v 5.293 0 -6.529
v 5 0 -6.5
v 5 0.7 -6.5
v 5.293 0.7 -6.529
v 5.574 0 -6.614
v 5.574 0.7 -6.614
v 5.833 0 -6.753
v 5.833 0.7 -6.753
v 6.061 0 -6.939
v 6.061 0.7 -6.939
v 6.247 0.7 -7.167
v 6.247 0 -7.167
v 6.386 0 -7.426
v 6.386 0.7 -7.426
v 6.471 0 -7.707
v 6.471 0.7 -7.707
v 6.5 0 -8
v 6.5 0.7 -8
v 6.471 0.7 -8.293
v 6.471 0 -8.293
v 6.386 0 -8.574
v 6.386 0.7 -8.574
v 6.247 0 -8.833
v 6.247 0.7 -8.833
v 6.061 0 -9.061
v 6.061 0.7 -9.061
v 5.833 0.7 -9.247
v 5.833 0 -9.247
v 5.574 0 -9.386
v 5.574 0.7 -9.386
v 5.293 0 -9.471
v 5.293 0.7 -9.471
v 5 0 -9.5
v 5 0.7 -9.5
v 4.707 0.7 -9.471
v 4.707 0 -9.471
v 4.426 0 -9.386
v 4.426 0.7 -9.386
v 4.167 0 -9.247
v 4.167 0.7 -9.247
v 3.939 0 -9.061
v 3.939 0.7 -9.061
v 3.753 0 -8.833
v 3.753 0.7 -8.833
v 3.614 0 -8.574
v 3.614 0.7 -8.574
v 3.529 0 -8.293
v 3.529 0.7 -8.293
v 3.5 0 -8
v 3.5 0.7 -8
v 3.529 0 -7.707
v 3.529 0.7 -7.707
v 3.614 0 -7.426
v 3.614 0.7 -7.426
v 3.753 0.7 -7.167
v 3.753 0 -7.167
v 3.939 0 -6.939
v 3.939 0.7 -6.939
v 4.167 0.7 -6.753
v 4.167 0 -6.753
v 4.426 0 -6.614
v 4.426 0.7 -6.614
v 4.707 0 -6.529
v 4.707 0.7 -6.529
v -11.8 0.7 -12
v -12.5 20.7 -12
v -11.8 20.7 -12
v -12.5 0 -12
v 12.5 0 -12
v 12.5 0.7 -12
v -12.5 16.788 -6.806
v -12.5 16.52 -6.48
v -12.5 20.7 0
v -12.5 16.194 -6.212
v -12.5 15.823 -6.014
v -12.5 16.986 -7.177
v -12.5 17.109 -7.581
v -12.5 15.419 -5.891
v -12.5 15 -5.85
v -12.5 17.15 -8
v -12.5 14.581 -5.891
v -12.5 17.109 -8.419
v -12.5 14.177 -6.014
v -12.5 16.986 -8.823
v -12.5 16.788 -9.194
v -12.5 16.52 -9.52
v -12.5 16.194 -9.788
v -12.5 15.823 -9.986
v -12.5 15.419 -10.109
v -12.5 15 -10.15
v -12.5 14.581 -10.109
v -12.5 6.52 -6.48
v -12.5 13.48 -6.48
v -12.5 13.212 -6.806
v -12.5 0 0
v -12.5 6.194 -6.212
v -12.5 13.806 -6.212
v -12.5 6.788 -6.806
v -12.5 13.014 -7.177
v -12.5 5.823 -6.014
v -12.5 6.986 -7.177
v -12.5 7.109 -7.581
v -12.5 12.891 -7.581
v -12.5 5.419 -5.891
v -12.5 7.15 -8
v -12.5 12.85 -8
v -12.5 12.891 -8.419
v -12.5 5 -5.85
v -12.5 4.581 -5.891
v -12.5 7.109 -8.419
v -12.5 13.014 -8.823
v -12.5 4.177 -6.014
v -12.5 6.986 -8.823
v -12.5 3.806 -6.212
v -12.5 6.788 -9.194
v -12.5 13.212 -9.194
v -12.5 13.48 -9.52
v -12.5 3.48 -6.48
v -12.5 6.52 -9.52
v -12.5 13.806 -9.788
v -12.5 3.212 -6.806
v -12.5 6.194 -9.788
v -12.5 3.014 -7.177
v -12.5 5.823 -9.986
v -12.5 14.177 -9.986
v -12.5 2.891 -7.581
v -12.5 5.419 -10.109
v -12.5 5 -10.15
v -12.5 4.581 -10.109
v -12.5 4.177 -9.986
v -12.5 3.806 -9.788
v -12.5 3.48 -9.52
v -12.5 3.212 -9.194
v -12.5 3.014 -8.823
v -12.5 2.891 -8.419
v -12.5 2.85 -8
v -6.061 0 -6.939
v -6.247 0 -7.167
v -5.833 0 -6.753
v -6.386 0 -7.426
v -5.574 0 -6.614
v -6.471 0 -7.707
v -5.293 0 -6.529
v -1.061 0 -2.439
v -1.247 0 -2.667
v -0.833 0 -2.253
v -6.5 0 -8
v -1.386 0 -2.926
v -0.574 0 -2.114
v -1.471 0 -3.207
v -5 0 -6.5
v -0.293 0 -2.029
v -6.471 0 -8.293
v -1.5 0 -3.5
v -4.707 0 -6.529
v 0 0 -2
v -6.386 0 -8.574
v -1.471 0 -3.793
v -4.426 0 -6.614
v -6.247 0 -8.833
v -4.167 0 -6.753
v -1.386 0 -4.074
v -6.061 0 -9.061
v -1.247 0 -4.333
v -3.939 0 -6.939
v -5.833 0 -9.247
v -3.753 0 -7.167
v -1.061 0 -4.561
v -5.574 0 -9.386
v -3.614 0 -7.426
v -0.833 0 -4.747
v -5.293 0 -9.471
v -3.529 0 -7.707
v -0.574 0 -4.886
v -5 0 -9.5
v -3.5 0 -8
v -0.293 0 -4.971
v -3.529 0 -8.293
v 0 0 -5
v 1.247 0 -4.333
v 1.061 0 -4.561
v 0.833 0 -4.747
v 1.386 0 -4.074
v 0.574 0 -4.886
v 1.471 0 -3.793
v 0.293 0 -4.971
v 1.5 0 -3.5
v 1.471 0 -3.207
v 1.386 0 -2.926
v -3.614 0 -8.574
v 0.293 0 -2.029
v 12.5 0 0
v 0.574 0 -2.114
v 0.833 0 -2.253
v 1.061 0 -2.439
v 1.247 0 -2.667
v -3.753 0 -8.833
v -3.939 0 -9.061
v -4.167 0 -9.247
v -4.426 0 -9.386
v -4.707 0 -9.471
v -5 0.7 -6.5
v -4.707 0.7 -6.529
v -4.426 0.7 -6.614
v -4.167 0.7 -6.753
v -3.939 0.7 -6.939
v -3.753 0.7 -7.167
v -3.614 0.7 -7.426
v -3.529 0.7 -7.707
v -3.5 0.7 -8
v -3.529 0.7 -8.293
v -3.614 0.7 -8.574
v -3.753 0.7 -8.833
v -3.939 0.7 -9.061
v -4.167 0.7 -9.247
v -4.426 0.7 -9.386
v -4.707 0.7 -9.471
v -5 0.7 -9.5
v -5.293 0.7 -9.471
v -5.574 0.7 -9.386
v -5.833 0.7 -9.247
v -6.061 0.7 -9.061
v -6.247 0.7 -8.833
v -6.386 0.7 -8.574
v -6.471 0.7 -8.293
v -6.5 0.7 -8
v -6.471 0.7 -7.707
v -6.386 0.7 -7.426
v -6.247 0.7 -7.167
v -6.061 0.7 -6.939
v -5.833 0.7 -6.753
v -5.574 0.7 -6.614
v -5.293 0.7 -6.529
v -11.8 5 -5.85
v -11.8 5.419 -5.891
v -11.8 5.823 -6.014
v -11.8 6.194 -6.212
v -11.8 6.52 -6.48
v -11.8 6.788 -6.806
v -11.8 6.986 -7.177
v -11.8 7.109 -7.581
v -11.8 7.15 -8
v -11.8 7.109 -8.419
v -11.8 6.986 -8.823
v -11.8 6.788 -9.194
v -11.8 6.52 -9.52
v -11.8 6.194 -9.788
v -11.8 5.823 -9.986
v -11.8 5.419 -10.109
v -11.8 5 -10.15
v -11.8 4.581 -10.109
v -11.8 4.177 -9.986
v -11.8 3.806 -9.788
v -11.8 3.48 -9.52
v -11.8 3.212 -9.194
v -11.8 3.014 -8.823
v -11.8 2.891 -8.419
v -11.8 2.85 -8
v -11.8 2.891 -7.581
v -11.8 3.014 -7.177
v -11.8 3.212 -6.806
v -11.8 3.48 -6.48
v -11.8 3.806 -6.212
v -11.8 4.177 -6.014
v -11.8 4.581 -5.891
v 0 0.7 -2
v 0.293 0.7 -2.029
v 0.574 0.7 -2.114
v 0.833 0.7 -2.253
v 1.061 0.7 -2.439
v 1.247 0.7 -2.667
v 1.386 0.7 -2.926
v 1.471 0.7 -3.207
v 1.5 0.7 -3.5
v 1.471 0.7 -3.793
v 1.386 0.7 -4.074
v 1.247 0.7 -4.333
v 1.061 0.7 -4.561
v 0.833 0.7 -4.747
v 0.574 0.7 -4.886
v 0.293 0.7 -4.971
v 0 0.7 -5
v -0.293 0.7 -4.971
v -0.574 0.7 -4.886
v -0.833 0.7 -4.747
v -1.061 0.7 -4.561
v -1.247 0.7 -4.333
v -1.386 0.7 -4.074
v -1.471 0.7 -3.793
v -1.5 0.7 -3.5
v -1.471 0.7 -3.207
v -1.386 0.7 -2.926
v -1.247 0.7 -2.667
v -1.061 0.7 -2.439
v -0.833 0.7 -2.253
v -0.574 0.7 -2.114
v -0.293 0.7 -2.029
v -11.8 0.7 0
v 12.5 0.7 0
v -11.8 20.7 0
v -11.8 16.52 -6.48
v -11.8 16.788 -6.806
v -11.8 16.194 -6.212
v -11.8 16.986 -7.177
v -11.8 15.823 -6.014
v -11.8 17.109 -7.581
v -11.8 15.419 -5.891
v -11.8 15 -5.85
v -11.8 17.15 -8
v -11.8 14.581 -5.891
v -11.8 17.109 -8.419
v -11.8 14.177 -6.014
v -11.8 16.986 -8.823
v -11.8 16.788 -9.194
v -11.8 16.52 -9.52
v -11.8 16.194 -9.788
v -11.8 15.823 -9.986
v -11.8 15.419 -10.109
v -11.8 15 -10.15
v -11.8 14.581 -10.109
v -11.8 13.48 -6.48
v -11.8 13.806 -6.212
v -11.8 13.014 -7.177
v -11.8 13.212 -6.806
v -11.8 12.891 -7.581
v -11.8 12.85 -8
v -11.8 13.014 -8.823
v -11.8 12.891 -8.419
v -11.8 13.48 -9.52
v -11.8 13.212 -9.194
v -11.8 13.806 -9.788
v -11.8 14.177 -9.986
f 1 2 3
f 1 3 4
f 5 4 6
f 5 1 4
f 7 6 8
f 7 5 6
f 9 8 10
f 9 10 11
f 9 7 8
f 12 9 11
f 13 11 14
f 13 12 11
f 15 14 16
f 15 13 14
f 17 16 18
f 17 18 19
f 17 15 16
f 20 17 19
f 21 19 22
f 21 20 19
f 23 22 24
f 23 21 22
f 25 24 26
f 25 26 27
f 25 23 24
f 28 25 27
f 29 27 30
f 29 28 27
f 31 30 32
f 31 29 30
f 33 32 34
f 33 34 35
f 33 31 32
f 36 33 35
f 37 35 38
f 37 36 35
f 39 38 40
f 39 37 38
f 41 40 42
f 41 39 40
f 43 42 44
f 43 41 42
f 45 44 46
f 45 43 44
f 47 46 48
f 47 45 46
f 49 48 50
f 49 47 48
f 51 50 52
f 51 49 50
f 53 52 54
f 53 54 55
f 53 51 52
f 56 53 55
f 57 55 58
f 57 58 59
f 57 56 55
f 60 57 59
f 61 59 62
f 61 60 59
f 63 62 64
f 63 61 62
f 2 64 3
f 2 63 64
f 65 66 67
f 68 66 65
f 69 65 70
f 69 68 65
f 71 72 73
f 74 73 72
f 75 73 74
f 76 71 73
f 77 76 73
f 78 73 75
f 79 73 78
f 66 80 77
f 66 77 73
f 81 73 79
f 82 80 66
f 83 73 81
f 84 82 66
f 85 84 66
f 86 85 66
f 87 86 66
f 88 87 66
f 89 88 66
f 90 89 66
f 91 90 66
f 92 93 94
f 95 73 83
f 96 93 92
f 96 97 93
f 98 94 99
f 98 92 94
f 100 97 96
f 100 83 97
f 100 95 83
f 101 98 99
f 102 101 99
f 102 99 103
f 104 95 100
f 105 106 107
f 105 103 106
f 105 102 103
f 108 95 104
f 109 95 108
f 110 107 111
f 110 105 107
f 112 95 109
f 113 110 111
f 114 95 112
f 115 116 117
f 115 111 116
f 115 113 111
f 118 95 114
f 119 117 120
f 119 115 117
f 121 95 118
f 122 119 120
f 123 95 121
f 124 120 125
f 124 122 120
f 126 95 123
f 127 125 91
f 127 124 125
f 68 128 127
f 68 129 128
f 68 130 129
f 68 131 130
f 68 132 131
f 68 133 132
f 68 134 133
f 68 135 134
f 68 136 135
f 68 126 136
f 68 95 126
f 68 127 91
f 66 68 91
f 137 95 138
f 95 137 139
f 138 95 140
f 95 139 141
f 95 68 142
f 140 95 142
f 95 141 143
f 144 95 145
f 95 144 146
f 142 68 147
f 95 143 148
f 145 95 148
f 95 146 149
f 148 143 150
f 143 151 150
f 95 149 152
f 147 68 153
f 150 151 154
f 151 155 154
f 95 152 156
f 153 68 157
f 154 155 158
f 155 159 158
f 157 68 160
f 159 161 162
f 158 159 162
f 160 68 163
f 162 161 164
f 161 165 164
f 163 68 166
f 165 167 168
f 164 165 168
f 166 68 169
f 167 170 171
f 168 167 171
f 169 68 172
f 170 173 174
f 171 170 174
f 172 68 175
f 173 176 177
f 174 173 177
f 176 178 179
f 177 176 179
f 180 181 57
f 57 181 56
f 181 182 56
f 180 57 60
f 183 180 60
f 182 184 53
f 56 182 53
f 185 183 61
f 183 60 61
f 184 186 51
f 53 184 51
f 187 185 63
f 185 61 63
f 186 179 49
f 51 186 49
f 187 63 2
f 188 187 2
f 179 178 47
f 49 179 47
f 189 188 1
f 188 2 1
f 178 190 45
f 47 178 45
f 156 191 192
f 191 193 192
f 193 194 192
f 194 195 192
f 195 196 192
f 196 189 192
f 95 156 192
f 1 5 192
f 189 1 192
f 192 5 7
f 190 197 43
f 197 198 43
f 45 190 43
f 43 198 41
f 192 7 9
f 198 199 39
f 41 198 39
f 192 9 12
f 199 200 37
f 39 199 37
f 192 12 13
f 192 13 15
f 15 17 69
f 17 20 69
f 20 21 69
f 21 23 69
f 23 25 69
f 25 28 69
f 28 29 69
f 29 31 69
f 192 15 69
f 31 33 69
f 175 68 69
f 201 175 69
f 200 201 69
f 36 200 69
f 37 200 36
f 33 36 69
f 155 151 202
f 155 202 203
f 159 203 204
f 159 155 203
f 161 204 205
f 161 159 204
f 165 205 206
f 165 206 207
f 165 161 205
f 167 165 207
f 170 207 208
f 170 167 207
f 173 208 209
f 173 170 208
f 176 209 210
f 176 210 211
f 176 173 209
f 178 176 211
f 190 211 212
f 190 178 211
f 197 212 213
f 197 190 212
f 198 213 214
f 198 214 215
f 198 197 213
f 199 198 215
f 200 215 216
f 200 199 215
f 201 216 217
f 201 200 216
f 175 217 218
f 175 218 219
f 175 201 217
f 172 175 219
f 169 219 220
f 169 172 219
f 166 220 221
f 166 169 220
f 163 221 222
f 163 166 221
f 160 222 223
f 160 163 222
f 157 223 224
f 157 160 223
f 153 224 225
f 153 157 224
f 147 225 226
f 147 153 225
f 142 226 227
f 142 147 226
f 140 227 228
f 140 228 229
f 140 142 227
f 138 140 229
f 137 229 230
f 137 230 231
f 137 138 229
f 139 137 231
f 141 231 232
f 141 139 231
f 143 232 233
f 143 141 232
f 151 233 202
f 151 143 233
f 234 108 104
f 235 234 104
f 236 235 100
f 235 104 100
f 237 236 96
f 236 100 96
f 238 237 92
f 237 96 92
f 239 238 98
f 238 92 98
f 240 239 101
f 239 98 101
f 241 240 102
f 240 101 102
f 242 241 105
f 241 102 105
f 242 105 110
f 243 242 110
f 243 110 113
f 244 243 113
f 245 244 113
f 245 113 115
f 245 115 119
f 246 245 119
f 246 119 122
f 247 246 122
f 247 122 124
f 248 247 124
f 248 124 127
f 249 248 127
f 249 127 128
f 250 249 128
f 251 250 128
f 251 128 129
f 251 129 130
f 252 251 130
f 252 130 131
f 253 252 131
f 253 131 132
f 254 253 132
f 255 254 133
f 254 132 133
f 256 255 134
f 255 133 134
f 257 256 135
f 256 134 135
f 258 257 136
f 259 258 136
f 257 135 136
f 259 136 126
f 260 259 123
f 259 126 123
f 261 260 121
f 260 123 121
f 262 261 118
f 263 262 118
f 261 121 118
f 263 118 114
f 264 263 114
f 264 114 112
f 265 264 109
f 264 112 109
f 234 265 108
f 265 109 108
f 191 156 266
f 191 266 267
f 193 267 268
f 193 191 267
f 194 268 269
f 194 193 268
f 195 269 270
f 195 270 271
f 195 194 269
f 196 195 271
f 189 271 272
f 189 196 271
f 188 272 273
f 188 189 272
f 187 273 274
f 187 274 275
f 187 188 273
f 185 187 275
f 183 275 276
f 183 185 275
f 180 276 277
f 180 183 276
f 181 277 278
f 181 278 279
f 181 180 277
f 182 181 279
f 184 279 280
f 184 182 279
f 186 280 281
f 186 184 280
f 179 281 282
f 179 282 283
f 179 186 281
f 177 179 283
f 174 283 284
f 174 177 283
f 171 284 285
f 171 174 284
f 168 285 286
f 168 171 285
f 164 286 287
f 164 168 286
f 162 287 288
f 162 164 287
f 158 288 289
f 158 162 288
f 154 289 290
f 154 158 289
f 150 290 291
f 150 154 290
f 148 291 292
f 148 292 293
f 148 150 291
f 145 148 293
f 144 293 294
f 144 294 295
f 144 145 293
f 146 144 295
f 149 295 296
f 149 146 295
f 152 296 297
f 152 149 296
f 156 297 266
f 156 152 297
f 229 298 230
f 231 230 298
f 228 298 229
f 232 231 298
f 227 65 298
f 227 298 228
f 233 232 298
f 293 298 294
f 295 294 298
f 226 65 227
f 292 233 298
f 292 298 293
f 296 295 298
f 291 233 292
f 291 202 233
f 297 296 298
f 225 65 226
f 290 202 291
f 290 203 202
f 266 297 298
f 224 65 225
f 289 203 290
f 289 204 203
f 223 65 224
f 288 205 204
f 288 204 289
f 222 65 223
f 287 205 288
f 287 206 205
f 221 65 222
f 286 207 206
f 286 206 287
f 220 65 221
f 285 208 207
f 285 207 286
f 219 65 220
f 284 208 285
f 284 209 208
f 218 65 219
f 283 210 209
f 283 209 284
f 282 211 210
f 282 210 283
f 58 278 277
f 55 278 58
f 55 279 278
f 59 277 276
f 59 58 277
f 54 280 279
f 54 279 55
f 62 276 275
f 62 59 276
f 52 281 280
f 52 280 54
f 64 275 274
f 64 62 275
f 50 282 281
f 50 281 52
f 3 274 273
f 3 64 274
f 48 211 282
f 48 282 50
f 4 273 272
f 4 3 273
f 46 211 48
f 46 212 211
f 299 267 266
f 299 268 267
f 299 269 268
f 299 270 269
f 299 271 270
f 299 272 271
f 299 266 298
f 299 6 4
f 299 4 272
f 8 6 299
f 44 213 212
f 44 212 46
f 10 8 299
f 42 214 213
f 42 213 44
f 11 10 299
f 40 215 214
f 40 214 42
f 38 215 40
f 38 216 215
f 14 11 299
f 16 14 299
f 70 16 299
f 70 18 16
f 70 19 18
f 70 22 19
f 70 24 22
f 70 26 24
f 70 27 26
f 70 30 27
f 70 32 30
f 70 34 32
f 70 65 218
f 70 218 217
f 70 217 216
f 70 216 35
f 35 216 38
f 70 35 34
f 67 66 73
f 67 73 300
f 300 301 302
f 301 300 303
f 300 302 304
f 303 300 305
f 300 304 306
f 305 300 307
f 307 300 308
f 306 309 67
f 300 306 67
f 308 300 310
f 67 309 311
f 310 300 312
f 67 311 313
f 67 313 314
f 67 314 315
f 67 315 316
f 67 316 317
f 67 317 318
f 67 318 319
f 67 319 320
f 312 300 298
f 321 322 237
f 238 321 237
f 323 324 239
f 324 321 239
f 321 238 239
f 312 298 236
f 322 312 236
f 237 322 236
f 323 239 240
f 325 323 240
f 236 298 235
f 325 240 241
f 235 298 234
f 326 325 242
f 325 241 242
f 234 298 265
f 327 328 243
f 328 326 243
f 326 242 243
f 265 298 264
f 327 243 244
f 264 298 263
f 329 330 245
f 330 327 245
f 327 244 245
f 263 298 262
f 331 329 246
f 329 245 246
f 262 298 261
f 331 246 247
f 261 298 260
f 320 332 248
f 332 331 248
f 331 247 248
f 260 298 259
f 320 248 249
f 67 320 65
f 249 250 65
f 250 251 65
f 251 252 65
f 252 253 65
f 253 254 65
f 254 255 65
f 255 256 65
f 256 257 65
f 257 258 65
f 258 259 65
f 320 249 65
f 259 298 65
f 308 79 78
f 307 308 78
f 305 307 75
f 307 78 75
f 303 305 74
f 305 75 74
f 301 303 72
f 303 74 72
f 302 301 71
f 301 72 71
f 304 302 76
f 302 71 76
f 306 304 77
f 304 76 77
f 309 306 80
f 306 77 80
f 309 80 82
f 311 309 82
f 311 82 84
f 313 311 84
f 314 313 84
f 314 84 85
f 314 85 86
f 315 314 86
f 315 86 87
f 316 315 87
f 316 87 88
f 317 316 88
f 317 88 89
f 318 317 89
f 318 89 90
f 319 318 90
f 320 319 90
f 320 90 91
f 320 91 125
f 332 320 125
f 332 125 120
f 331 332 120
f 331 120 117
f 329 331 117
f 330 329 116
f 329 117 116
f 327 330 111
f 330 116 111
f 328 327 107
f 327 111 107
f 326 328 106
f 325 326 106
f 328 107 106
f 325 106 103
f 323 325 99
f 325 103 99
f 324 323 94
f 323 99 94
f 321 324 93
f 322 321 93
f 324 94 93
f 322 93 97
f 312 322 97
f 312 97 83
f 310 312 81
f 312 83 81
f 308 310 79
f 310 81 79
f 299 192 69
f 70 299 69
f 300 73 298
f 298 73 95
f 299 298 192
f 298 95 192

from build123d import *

# Parameters (mm, degrees)
SKETCH1_W           = 25
SKETCH1_H           = 12
SKETCH1_R           = 1.5
BOSS_EXTRUDE1_DEPTH = 0.7
SKETCH3_W           = 0.7
SKETCH3_H           = 12
BOSS_EXTRUDE3_DEPTH = 20
SKETCH4_R           = 2.15
CUT_EXTRUDE1_DEPTH  = 35.604768458


with BuildPart() as part:
    # Sketch1 → Boss-Extrude1 (new body)
    with BuildSketch(Plane(origin=(0, 0, 0), x_dir=(1, 0, 0), z_dir=(0, 1, 0))):
        with Locations((0, 6)):
            Rectangle(SKETCH1_W, SKETCH1_H)
        with Locations(Location((-5, 8, 0), (0, 0, 270))):
            Circle(SKETCH1_R, mode=Mode.SUBTRACT)
        with Locations(Location((5, 8, 0), (0, 0, 270))):
            Circle(SKETCH1_R, mode=Mode.SUBTRACT)
        with Locations(Location((0, 3.5, 0), (0, 0, 270))):
            Circle(SKETCH1_R, mode=Mode.SUBTRACT)
    extrude(amount=BOSS_EXTRUDE1_DEPTH)

    # Sketch3 → Boss-Extrude3 (add)
    with BuildSketch(Plane(origin=(0, 0.7, 0), x_dir=(1, 0, 0), z_dir=(0, 1, 0))):
        with Locations((-12.15, 6)):
            Rectangle(SKETCH3_W, SKETCH3_H)
    extrude(amount=BOSS_EXTRUDE3_DEPTH)

    # Sketch4 → Cut-Extrude1 (cut, through all)
    with BuildSketch(Plane.ZY.offset(12.5)):
        with Locations((-8, 5)):
            Circle(SKETCH4_R)
        with Locations((-8, 15)):
            Circle(SKETCH4_R)
    extrude(amount=-CUT_EXTRUDE1_DEPTH, mode=Mode.SUBTRACT)


solid = part.part
